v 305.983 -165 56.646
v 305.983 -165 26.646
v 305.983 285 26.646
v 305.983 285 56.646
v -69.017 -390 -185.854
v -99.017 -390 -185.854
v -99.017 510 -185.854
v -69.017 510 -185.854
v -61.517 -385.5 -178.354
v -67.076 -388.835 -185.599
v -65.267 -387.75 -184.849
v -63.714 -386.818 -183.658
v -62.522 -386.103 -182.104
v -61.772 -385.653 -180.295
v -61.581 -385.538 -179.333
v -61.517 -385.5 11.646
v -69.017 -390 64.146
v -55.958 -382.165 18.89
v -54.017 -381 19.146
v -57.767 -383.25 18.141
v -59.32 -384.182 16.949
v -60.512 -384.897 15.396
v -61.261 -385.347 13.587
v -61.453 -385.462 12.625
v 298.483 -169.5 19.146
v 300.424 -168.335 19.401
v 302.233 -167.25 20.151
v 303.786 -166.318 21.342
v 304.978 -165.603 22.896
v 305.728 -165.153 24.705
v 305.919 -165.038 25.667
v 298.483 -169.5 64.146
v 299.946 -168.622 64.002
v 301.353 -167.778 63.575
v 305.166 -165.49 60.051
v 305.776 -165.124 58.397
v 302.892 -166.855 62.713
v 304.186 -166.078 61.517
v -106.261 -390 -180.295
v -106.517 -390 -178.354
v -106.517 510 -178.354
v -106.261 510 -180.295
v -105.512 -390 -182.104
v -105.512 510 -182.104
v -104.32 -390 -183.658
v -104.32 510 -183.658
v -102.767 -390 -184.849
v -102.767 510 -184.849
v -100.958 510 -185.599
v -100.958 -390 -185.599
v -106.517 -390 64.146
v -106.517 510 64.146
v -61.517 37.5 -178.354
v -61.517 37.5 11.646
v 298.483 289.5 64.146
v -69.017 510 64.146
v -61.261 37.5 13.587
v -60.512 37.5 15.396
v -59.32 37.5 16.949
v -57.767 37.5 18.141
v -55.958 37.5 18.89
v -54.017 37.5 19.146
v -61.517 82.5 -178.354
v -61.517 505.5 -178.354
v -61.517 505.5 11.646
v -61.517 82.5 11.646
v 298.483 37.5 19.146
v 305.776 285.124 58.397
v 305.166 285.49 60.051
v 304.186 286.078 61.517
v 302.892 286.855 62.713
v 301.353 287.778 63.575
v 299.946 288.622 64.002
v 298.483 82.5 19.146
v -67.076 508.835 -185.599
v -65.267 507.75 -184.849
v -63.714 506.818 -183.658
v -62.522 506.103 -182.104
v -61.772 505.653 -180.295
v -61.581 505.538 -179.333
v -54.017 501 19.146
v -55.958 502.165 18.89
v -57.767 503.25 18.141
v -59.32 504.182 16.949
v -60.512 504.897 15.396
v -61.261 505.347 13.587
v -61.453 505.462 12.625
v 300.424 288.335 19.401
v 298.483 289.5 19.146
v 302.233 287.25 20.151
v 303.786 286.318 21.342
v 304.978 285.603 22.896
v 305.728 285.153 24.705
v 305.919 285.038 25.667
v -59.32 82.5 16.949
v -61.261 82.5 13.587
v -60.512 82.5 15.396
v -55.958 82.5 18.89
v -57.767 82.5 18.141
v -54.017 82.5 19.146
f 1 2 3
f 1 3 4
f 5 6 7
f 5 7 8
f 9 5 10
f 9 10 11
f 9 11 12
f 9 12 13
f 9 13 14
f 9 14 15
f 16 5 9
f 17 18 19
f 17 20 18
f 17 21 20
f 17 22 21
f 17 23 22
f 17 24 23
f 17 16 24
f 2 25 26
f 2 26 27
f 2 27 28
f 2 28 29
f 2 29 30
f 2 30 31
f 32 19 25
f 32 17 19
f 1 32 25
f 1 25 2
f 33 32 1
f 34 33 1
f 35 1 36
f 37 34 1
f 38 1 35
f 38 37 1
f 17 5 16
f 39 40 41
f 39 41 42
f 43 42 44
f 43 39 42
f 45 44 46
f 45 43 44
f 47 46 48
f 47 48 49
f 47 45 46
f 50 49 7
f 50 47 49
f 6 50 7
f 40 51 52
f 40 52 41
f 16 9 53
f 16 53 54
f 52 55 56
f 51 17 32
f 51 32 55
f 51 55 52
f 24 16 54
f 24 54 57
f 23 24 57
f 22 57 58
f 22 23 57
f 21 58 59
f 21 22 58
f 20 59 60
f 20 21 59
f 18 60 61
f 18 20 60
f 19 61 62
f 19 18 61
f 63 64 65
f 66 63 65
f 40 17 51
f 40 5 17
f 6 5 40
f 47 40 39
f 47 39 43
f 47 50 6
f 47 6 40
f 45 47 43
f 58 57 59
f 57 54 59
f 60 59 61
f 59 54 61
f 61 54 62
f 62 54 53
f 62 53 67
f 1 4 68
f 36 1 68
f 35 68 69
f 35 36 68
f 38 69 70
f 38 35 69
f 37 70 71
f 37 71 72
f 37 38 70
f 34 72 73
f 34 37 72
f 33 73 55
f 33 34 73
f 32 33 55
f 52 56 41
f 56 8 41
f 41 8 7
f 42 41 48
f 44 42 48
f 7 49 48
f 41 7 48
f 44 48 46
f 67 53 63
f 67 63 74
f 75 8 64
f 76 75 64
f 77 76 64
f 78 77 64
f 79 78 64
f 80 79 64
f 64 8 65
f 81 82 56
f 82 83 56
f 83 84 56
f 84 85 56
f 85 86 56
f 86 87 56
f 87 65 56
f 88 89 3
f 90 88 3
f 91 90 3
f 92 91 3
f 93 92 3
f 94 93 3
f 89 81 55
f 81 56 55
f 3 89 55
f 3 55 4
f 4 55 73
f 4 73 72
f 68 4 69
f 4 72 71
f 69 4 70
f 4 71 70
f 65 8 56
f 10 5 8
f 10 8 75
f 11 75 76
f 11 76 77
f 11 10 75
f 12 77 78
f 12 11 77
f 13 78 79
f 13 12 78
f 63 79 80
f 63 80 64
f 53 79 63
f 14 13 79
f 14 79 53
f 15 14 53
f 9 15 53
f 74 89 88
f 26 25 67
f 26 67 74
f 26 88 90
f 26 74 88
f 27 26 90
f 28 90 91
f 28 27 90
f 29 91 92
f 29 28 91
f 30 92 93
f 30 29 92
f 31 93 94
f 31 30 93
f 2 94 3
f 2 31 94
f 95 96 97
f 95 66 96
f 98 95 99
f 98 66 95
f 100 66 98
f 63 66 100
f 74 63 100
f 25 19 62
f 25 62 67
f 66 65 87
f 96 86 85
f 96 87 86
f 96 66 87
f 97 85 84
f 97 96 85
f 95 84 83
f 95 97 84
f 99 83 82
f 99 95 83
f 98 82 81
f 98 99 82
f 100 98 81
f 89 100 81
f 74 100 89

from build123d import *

# Parameters (mm, degrees)
BOSS_EXTRUDE1_DEPTH = 120
RIB6_REACH          = 89.955
SKETCH4_WALL_W      = 232.65925255
SKETCH4_WALL_H      = 6
CUT_EXTRUDE1_DEPTH  = 137.147387456
SCALE3_SCALE        = 7.5


with BuildPart() as part:
    # Sketch1 → Boss-Extrude1 (new body)
    with BuildSketch(Plane(origin=(0, 0, 0), x_dir=(1, 0, 0), z_dir=(0, 1, 0))):
        with BuildLine():
            Line((0, 0), (0, 32.333333333))
            ThreePointArc((0, 32.333333333), (0.292893219, 33.040440115), (1, 33.333333333))
            Line((1, 33.333333333), (5, 33.333333333))
            ThreePointArc((5, 33.333333333), (5.707106781, 33.040440115), (6, 32.333333333))
            Line((6, 32.333333333), (6, 7))
            ThreePointArc((6, 7), (6.292893219, 6.292893219), (7, 6))
            Line((7, 6), (54, 6))
            ThreePointArc((54, 6), (54.707106781, 5.707106781), (55, 5))
            Line((55, 5), (55, 1))
            ThreePointArc((55, 1), (54.707106781, 0.292893219), (54, 0))
            Line((54, 0), (0, 0))
        make_face()
    extrude(amount=BOSS_EXTRUDE1_DEPTH)

    # Sketch4 wall → Rib6 (add, up to next)
    with BuildSketch(Plane(origin=(30, 60, -19.166666666), x_dir=(0.876729593434, 0, 0.480983596392), z_dir=(0.480983596392, 0, -0.876729593434)), mode=Mode.PRIVATE) as rib6_sk1:
        Rectangle(SKETCH4_WALL_W, SKETCH4_WALL_H)
    rib6_tool1 = extrude(rib6_sk1.sketch, amount=-RIB6_REACH, mode=Mode.PRIVATE) - part.part
    add(rib6_tool1.solids().sort_by_distance((30, 60, -19.166666666))[0])

    # Sketch5 → Cut-Extrude1 (cut, through all)
    with BuildSketch(Plane.XY):
        Polygon((55, 120), (5, 120), (55, 90), align=None)
        Polygon((55, 30), (55, 0), (5, 0), align=None)
    extrude(amount=-CUT_EXTRUDE1_DEPTH, mode=Mode.SUBTRACT)


with BuildPart() as part_1:
    # Scale3: scaled about (16.387200979, 60, -9.868580773)
    add(part.part.scale(SCALE3_SCALE).moved(Location((-106.516806363, -390, 64.145775024))))


solid = part_1.part
